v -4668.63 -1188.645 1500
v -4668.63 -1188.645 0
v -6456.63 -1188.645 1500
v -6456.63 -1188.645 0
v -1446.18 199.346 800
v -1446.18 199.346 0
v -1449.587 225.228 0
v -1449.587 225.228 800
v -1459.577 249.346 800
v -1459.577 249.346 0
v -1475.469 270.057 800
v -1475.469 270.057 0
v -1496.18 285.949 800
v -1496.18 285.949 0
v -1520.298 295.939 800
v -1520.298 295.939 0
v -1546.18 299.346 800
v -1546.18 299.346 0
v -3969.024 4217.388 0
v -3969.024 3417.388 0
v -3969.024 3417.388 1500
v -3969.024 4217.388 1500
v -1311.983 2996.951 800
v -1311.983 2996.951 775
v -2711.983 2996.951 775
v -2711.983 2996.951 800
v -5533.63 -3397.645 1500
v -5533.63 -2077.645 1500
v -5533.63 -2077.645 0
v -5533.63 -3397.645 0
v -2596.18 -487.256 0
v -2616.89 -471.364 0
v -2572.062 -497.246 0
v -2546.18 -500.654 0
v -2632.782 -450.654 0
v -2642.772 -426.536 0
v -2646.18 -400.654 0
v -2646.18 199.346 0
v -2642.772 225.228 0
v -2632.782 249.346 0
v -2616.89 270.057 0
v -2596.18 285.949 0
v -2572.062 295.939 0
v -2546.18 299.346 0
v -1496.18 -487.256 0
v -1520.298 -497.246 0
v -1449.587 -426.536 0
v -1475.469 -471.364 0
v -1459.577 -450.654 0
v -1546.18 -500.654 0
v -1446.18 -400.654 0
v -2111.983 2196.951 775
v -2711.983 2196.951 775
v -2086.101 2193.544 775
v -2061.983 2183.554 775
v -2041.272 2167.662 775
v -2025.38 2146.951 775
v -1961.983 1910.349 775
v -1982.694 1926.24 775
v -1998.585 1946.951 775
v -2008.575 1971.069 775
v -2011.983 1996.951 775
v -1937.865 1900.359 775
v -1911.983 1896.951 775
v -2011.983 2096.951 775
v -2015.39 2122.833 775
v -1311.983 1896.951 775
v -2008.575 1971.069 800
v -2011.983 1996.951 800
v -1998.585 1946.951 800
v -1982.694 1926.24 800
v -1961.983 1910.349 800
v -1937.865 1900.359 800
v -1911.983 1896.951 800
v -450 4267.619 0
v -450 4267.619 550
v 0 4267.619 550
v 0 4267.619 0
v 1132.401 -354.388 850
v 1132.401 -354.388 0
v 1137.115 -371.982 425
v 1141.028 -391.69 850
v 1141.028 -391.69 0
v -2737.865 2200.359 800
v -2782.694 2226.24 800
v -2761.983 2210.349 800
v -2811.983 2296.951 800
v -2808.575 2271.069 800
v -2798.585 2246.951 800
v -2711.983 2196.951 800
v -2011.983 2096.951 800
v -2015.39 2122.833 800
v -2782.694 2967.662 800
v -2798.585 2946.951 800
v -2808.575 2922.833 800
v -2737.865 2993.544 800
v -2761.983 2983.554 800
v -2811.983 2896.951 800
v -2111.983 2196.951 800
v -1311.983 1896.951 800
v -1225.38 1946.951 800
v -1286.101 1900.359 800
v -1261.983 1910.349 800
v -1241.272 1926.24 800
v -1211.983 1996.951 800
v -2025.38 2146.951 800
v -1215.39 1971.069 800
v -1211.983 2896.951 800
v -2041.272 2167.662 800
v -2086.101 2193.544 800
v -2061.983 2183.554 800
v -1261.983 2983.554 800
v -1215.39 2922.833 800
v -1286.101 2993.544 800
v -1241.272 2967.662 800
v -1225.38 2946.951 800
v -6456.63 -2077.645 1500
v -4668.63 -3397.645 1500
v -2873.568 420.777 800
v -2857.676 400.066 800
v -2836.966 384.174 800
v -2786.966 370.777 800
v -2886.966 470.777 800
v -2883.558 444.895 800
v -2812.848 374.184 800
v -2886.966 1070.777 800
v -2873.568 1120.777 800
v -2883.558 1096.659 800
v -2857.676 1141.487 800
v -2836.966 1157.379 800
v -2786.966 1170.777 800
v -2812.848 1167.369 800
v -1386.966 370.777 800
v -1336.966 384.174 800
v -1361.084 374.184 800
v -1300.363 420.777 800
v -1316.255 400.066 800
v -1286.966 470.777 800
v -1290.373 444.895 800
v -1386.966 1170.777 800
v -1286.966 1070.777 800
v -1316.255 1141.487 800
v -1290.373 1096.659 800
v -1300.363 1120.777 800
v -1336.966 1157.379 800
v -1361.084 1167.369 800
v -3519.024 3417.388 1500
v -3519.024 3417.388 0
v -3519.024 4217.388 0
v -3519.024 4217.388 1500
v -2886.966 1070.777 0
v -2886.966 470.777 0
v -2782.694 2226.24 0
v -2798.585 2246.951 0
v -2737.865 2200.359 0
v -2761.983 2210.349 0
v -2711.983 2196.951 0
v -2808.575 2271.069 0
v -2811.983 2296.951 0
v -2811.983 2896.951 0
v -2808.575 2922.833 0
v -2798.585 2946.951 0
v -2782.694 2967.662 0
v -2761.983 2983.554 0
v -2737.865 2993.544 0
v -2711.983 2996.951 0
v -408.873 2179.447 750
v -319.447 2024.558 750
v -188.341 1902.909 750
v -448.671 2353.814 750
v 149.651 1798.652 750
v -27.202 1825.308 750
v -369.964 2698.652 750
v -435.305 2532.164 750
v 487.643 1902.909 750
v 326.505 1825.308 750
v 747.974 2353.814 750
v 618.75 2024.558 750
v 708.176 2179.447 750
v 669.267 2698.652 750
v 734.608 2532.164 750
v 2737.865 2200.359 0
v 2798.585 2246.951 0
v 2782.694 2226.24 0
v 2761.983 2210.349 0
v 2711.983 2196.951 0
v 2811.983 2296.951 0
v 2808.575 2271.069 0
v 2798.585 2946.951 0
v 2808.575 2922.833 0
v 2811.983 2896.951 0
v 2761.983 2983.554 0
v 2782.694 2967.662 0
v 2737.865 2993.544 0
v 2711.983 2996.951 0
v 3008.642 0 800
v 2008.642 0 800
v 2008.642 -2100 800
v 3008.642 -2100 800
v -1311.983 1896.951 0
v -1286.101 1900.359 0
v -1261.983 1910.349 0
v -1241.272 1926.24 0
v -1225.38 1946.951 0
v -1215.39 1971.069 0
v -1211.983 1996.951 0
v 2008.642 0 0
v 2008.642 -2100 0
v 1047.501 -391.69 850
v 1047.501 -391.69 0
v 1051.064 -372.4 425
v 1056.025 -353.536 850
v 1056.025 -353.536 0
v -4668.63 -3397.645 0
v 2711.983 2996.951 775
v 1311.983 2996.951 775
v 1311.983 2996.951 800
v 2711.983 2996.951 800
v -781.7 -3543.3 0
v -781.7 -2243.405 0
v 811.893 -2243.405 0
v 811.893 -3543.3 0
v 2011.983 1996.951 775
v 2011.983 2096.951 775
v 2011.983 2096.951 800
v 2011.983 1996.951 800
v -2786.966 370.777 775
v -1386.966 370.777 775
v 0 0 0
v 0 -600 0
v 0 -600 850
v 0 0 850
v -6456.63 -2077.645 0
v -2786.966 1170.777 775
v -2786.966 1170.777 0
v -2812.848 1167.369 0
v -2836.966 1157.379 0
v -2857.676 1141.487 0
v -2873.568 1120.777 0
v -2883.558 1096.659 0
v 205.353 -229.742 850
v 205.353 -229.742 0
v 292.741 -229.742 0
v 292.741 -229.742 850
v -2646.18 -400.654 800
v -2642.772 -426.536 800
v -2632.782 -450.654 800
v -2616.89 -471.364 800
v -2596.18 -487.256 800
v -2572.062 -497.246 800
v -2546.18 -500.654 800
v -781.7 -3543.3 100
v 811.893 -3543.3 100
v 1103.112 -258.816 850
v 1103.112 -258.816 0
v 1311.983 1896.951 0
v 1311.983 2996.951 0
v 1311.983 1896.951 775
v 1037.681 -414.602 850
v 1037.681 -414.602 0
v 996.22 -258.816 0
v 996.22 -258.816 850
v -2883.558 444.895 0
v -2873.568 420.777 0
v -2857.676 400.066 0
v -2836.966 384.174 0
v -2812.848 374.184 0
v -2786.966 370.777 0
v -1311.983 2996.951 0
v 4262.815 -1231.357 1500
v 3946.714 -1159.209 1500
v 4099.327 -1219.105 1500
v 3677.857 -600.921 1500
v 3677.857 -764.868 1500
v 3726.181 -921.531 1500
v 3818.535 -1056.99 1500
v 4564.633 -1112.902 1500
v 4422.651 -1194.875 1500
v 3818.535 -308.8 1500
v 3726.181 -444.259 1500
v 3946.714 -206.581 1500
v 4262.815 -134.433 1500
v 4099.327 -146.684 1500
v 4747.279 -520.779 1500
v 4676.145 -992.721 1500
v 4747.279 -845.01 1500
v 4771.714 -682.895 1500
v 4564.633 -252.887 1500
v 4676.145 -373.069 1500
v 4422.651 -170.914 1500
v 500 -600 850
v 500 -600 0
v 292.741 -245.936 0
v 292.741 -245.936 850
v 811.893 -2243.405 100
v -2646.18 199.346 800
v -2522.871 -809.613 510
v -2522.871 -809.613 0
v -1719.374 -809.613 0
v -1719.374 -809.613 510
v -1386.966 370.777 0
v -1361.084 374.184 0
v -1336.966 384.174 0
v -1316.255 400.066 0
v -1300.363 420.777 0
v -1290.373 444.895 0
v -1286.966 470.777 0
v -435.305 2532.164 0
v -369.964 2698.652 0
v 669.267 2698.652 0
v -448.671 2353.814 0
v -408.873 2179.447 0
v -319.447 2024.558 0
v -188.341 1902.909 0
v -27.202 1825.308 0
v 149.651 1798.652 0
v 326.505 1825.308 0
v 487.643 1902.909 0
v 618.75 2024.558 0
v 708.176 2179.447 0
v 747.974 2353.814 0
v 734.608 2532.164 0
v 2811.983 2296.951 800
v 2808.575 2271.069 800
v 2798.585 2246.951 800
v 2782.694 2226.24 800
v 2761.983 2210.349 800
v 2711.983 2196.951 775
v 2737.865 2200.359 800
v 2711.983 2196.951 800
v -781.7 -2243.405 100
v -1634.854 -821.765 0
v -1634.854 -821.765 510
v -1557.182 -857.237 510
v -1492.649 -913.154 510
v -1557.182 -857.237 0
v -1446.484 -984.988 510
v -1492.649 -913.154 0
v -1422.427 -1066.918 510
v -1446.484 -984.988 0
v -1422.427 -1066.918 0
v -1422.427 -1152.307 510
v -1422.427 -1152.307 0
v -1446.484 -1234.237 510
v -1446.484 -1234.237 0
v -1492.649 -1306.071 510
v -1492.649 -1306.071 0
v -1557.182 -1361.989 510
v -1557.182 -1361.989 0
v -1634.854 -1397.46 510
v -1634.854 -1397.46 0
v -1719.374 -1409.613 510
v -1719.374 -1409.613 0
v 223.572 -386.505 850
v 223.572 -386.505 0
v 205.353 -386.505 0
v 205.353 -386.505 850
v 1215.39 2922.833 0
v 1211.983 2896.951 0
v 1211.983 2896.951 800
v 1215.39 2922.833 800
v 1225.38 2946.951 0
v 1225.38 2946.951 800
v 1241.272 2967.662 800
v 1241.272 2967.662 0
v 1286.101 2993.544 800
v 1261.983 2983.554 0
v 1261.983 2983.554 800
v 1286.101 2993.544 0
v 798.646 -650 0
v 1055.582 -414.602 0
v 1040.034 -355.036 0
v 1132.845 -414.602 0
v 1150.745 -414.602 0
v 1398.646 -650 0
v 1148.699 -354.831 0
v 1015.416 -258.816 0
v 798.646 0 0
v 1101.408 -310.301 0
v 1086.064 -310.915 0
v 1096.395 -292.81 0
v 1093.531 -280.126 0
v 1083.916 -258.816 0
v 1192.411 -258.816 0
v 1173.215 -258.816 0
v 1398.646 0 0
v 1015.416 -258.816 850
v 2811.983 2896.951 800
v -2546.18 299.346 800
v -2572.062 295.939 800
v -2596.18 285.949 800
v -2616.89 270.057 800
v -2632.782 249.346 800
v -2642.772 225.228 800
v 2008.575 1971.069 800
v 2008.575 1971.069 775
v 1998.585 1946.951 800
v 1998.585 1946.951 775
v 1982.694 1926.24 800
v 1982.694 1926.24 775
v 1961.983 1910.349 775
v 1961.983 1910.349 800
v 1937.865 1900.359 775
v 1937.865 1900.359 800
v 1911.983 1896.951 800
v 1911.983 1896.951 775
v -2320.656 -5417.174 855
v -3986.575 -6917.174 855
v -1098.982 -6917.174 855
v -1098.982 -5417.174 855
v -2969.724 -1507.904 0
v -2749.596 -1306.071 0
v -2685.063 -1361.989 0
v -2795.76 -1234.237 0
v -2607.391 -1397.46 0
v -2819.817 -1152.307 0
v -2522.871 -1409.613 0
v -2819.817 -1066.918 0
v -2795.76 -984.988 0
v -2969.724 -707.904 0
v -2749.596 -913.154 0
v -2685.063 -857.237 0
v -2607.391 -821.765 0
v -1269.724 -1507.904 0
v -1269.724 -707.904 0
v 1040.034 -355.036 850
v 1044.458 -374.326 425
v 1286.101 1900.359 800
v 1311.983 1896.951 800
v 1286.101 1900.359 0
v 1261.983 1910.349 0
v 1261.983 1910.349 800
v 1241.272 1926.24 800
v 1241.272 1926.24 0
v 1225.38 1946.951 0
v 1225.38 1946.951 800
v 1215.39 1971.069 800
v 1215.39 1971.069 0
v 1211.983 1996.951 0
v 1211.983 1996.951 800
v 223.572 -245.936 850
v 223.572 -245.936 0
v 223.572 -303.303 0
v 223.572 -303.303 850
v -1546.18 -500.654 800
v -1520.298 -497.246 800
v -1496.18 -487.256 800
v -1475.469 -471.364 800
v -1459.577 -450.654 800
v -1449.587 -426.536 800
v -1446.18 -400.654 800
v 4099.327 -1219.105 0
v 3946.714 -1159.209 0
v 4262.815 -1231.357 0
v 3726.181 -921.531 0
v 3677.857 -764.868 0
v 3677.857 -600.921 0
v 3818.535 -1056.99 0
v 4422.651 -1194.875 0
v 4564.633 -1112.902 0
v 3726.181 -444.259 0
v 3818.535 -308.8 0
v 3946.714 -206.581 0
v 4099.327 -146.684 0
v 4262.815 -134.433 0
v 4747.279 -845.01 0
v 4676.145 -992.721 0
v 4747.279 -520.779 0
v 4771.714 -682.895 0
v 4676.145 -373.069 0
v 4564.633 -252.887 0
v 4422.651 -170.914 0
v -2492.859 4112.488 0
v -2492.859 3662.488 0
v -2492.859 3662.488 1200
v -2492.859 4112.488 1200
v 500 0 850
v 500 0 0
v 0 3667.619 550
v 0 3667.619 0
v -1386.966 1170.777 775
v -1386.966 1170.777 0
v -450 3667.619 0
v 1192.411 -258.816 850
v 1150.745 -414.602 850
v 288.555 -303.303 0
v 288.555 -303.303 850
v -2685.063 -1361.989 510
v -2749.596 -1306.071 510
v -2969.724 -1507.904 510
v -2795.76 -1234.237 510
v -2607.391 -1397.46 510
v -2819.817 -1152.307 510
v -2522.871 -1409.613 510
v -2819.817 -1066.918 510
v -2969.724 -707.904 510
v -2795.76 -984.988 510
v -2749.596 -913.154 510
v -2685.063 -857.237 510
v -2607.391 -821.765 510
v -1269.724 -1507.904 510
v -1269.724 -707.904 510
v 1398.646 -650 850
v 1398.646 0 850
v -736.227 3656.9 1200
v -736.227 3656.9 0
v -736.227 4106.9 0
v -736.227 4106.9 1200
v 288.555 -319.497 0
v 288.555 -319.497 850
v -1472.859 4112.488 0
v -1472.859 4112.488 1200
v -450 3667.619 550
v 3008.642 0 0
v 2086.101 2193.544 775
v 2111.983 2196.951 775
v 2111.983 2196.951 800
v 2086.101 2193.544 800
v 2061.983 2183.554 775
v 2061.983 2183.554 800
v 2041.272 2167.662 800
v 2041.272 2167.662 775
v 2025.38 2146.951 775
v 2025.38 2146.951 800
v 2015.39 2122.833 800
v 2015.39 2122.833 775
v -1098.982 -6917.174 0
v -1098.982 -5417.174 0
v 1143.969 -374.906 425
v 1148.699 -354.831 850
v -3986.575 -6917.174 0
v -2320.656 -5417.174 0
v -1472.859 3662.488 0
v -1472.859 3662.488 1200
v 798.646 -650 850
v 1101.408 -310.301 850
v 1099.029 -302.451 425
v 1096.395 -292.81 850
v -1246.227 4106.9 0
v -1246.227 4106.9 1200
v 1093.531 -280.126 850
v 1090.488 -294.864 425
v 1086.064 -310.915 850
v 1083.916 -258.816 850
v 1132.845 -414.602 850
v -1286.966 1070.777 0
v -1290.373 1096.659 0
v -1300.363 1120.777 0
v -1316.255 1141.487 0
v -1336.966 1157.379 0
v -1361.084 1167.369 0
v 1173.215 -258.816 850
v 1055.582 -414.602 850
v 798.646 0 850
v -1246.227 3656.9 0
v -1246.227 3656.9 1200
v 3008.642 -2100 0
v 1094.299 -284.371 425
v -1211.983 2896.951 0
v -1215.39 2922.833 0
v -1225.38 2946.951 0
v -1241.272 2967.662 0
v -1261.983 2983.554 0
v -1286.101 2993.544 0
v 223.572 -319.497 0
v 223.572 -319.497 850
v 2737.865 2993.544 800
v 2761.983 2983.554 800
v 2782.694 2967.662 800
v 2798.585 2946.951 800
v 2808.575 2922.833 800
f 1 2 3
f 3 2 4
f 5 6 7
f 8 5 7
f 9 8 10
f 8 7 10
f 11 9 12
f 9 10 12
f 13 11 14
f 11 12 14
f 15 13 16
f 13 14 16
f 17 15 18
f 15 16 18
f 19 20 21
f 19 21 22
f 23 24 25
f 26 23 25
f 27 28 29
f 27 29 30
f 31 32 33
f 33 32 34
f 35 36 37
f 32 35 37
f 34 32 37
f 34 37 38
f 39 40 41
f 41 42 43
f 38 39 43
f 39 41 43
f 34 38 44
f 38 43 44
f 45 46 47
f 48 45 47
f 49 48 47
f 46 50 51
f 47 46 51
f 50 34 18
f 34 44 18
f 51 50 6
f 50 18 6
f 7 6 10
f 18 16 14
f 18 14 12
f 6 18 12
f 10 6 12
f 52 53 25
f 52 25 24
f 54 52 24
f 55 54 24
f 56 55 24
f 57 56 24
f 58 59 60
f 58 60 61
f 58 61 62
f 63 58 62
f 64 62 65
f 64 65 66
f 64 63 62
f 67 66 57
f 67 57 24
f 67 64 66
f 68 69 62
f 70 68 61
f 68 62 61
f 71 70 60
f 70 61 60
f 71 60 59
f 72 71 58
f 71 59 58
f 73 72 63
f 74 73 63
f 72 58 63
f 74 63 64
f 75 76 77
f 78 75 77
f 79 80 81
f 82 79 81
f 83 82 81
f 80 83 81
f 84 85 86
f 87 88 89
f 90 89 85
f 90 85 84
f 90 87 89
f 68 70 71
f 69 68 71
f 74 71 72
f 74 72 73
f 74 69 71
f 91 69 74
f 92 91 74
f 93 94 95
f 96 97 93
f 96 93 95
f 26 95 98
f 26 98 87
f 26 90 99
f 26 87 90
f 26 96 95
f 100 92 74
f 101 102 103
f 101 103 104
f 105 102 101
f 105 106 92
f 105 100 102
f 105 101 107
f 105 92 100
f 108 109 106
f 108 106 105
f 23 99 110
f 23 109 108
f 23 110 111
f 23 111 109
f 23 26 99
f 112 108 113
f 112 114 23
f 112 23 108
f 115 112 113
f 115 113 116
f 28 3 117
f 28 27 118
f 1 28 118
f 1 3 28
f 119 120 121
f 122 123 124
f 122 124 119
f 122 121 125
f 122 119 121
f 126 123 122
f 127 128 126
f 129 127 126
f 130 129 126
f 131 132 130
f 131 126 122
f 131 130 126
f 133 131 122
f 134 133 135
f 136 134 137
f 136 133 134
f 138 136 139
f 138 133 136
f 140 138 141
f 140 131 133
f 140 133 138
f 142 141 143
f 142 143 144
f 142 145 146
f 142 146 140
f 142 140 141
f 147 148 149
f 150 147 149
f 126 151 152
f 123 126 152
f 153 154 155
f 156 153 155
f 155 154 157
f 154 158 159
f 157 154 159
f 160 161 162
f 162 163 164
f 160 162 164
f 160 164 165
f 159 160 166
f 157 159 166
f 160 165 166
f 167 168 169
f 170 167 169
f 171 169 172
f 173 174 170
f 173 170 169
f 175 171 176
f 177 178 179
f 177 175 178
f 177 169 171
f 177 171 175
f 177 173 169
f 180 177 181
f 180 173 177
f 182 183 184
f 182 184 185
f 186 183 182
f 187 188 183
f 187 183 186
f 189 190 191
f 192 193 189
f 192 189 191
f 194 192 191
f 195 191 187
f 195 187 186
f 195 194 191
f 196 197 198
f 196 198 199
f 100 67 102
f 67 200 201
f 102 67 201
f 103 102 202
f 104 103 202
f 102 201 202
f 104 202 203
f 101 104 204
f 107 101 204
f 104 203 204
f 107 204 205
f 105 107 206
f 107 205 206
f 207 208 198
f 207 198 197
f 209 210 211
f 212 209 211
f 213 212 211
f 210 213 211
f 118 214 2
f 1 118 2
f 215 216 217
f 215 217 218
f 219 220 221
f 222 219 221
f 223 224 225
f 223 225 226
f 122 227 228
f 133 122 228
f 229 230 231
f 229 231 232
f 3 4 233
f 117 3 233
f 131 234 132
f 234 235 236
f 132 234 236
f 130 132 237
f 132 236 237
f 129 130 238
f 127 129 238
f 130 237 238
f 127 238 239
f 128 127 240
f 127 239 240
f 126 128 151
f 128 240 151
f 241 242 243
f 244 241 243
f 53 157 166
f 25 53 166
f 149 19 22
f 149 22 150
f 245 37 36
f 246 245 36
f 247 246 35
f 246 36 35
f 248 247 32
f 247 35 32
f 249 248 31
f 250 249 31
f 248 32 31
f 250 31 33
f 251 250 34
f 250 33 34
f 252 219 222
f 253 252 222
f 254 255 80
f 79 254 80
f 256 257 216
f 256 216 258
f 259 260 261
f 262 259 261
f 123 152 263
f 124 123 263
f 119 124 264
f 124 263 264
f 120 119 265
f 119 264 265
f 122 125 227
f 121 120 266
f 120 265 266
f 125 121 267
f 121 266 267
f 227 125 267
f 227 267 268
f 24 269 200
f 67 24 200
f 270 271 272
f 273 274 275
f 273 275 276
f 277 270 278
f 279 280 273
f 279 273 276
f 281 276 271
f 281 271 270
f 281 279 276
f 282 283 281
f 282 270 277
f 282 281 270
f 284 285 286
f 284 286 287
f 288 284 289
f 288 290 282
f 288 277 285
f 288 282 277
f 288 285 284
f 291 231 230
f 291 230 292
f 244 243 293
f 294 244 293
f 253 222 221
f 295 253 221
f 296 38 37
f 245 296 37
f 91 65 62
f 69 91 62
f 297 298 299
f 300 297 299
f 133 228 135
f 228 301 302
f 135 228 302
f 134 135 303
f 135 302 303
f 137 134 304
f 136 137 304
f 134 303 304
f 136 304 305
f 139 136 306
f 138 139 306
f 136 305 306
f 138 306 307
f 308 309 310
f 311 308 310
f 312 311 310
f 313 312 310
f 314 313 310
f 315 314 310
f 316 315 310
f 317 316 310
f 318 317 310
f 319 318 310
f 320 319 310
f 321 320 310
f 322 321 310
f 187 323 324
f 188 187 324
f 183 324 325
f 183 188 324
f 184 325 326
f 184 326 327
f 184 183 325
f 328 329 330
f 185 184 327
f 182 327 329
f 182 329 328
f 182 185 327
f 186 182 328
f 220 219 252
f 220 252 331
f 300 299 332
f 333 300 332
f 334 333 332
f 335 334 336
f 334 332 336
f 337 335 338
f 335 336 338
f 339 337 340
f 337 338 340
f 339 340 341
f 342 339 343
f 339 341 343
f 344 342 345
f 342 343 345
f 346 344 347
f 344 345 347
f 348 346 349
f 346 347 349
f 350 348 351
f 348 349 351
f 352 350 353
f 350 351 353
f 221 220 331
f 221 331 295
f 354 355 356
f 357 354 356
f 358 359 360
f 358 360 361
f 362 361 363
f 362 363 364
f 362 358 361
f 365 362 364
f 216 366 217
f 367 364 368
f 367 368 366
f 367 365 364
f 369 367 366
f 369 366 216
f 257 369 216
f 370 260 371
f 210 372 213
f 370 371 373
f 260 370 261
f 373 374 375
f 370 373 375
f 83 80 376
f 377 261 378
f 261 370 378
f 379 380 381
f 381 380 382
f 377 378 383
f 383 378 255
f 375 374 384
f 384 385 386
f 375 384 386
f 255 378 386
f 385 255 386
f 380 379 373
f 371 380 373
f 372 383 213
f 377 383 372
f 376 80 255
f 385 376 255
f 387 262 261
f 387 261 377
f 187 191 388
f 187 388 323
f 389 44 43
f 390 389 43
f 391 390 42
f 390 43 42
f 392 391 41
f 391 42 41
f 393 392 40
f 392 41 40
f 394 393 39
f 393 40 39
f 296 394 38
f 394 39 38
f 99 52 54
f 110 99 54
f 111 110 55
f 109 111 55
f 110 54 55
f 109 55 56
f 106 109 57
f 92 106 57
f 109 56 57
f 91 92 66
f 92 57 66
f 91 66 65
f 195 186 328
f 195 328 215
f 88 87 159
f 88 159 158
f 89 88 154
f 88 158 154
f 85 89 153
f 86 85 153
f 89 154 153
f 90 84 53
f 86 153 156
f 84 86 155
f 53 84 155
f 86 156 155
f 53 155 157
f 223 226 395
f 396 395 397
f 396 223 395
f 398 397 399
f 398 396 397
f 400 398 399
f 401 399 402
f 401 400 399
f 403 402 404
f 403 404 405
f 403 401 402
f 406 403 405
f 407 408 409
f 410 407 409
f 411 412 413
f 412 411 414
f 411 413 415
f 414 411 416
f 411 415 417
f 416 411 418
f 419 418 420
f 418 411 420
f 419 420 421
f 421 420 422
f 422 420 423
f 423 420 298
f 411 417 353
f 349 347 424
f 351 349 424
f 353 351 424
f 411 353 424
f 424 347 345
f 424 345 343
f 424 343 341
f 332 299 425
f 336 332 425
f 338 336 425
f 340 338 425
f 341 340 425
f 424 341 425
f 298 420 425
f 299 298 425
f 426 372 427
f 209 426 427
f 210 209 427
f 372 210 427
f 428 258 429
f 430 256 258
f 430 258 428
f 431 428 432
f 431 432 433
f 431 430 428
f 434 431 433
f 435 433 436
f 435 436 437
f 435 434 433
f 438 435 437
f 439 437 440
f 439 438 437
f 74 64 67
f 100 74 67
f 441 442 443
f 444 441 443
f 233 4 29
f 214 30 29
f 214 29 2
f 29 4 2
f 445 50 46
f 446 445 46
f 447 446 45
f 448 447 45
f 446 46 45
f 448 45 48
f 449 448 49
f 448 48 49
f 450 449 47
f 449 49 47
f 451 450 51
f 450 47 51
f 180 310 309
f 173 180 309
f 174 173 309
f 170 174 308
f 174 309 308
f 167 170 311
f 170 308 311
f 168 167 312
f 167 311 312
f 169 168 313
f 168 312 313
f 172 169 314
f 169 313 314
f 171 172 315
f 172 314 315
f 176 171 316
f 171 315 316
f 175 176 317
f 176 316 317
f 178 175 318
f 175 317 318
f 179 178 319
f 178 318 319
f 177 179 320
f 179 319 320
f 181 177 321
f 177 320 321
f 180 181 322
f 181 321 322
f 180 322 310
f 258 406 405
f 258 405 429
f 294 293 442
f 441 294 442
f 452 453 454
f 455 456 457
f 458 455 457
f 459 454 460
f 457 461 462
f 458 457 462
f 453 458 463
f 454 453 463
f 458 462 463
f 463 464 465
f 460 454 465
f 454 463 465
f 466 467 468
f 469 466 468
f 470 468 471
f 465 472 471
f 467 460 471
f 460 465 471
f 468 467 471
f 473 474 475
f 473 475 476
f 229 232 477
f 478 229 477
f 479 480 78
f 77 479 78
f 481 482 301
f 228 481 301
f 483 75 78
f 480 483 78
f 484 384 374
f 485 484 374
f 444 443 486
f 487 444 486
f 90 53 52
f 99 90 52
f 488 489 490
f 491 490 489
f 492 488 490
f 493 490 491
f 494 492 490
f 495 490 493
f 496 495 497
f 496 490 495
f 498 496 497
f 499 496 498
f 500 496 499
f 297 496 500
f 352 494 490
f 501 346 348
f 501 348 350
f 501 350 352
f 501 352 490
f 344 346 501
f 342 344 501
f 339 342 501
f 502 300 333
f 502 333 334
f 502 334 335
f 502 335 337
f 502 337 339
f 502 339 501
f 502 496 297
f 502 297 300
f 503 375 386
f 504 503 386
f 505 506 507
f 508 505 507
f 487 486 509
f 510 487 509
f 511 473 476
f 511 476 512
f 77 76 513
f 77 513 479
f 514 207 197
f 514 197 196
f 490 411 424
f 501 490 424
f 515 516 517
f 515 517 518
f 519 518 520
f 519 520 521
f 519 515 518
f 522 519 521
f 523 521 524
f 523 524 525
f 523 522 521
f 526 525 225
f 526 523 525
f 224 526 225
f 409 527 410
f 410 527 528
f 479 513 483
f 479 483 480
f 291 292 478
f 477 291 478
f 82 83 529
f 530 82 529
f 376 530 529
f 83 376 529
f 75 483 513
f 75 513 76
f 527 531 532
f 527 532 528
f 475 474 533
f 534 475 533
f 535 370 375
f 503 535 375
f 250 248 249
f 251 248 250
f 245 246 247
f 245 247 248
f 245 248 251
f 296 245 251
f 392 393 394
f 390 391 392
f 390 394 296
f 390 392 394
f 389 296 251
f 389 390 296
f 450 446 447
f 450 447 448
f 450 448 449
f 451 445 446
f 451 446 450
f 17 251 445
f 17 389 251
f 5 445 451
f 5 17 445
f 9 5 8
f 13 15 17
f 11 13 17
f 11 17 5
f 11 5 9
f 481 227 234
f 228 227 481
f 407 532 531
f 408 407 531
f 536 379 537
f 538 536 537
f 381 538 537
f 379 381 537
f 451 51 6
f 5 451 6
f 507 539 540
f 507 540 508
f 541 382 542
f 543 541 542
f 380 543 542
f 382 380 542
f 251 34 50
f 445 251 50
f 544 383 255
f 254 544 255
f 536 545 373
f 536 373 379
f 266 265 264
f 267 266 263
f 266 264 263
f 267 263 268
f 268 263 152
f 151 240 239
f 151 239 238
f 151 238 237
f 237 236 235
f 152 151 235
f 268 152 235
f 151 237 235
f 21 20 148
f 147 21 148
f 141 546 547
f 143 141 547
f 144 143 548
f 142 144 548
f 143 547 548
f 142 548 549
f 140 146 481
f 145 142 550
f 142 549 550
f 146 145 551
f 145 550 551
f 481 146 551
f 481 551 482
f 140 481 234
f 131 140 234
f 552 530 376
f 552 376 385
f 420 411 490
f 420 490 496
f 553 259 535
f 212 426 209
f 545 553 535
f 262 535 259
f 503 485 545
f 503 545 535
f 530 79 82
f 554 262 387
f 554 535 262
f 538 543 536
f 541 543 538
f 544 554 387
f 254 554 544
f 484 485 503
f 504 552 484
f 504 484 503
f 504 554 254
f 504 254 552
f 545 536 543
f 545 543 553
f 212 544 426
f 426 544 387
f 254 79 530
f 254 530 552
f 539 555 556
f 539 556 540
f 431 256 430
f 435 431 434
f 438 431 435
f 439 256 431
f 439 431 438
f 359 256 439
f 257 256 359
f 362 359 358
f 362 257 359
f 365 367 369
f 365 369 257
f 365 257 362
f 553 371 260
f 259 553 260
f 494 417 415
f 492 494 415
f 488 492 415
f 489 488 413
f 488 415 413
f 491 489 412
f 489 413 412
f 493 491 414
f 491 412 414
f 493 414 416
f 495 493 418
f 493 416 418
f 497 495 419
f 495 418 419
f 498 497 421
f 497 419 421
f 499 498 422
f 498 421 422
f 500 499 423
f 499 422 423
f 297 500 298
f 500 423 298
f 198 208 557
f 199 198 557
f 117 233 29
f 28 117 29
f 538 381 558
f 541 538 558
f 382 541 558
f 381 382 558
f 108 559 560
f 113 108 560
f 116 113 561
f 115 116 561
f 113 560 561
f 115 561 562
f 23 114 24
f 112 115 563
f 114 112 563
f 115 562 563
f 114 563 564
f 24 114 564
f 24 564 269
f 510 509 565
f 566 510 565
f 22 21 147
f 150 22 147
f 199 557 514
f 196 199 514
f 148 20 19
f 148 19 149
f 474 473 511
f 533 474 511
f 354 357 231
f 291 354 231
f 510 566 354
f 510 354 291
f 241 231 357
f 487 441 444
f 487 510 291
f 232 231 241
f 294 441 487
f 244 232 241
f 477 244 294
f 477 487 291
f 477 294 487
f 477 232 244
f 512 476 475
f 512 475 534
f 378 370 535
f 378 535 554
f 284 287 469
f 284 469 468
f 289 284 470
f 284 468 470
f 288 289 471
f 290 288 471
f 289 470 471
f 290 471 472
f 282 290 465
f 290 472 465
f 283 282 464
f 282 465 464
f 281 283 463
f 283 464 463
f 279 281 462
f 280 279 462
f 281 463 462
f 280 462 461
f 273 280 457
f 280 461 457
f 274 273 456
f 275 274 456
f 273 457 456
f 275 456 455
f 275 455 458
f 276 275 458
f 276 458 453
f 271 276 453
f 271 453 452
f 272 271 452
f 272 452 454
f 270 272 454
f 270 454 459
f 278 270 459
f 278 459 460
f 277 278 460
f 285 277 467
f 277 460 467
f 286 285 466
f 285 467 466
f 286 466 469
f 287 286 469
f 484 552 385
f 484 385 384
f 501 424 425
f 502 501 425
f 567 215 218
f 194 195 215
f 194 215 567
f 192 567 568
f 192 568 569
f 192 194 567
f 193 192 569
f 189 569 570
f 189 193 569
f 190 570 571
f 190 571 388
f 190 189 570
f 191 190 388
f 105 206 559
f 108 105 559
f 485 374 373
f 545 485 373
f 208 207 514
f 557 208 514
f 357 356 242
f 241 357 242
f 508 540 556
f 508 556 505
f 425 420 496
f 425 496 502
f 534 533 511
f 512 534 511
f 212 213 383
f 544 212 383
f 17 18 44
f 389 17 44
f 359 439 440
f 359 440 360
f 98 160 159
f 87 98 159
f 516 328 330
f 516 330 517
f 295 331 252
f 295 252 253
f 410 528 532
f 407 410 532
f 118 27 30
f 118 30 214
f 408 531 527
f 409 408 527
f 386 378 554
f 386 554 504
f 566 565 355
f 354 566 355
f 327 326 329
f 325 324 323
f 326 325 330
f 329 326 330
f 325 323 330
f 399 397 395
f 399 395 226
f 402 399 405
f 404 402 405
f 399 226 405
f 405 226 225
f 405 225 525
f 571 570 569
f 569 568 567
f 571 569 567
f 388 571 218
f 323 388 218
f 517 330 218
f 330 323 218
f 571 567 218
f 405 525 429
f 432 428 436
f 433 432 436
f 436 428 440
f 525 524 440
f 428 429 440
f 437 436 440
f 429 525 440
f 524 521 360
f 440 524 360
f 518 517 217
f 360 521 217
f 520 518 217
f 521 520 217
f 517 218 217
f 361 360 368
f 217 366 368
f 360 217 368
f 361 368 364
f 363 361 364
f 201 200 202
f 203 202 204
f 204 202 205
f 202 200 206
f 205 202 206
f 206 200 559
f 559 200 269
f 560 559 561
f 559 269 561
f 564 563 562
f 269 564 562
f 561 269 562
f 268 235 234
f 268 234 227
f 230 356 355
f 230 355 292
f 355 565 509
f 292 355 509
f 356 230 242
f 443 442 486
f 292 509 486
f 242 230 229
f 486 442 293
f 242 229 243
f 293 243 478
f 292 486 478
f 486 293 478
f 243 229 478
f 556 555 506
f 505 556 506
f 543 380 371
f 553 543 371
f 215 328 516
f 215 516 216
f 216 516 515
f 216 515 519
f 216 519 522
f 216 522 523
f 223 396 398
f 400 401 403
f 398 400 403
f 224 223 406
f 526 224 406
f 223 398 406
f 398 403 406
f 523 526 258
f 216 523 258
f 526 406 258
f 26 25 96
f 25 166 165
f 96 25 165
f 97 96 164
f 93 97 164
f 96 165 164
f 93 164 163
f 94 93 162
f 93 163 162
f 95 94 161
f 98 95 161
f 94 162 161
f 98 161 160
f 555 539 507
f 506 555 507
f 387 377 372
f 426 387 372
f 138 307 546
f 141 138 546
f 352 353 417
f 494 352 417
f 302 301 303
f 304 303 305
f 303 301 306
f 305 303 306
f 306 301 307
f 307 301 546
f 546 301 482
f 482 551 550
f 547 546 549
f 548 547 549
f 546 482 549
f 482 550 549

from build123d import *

# Parameters (mm, degrees)
F0_W      = 500
F0_H      = 600
F1_DEPTH  = 850
F2_W      = 600
F2_H      = 650
F3_DEPTH  = 850
F4_W      = 1000
F4_H      = 2100
F5_DEPTH  = 800
F6_R      = 550
F7_DEPTH  = 1500
F8_W      = 1700
F8_H      = 800
F9_DEPTH  = 510
F11_DEPTH = 855
F12_W     = 1593.5931801796
F12_H     = 1299.8950481415
F13_DEPTH = 100
F15_DEPTH = 800
F17_DEPTH = 800
F18_W     = 1020
F18_H     = 450
F19_DEPTH = 1200
F21_DEPTH = 750
F23_DEPTH = 800
F24_W     = 510
F24_H     = 450
F25_DEPTH = 1200
F26_W     = 450
F26_H     = 600
F27_DEPTH = 550
F28_W     = 1400
F28_H     = 800
F29_DEPTH = 775
F31_DEPTH = 775
F33_W     = 450
F33_H     = 800
F34_DEPTH = 1500
F36_DEPTH = 1500


with BuildPart() as f1:
    # F0 (on Top) → F1 (new body)
    with BuildSketch(Plane.XY):
        with Locations((250, -300)):
            Rectangle(F0_W, F0_H)
        Polygon((223.5717567124, -319.4969488541), (223.5717567124, -386.5047097206), (205.3530567533, -386.5047097206), (205.3530567533, -229.7415456657), (292.741058252, -229.7415456657), (292.741058252, -245.9359456293), (223.5717567124, -245.9359456293), (223.5717567124, -303.3025488904), (288.5552175835, -303.3025488904), (288.5552175835, -319.4969488541), align=None, mode=Mode.SUBTRACT)
    extrude(amount=F1_DEPTH)


with BuildPart() as f3:
    # F2 (on Top) → F3 (new body)
    with BuildSketch(Plane.XY):
        with Locations((1098.6456545318, -325)):
            Rectangle(F2_W, F2_H)
        with BuildLine():
            Line((1192.4111198944, -258.8157182715), (1150.7452339348, -414.6024882793))
            Line((1150.7452339348, -414.6024882793), (1132.8445873482, -414.6024882793))
            Line((1132.8445873482, -414.6024882793), (1101.4076422952, -310.3013875015))
            add(Edge.make_bspline(
                [(1101.4076422952, -310.3013875015), (1099.1572752957, -303.345707685), (1096.3954612509, -292.8098985511)],
                knots=[0, 0, 0, 1, 1, 1], degree=2))
            add(Edge.make_bspline(
                [(1096.3954612509, -292.8098985511), (1093.6336472061, -282.2740894173), (1093.5313577971, -280.1260118269)],
                knots=[0, 0, 0, 1, 1, 1], degree=2))
            add(Edge.make_bspline(
                [(1093.5313577971, -280.1260118269), (1091.1787013885, -294.2078538084), (1086.0642309352, -310.9151239559)],
                knots=[0, 0, 0, 1, 1, 1], degree=2))
            Line((1086.0642309352, -310.9151239559), (1055.5819870335, -414.6024882793))
            Line((1055.5819870335, -414.6024882793), (1037.6813404469, -414.6024882793))
            Line((1037.6813404469, -414.6024882793), (996.2200333054, -258.8157182715))
            Line((996.2200333054, -258.8157182715), (1015.4163457402, -258.8157182715))
            Line((1015.4163457402, -258.8157182715), (1040.0339968554, -355.0359557331))
            add(Edge.make_bspline(
                [(1040.0339968554, -355.0359557331), (1045.1484673087, -375.2892587282), (1047.5011237173, -391.6896606485)],
                knots=[0, 0, 0, 1, 1, 1], degree=2))
            add(Edge.make_bspline(
                [(1047.5011237173, -391.6896606485), (1050.3652271711, -372.1864799865), (1056.0252411394, -353.5357110668)],
                knots=[0, 0, 0, 1, 1, 1], degree=2))
            Line((1056.0252411394, -353.5357110668), (1083.9161533448, -258.8157182715))
            Line((1083.9161533448, -258.8157182715), (1103.1124657796, -258.8157182715))
            Line((1103.1124657796, -258.8157182715), (1132.4013332422, -354.388122809))
            add(Edge.make_bspline(
                [(1132.4013332422, -354.388122809), (1137.5158036956, -370.9249106081), (1141.0277400735, -391.6896606485)],
                knots=[0, 0, 0, 1, 1, 1], degree=2))
            add(Edge.make_bspline(
                [(1141.0277400735, -391.6896606485), (1143.0735282548, -376.5508281067), (1148.6994457535, -354.831376915)],
                knots=[0, 0, 0, 1, 1, 1], degree=2))
            Line((1148.6994457535, -354.831376915), (1173.2148074597, -258.8157182715))
            Line((1173.2148074597, -258.8157182715), (1192.4111198944, -258.8157182715))
        make_face(mode=Mode.SUBTRACT)
    extrude(amount=F3_DEPTH)


with BuildPart() as f5:
    # F4 (on Top) → F5 (new body)
    with BuildSketch(Plane.XY):
        with Locations((2508.6424085116, -1050)):
            Rectangle(F4_W, F4_H)
    extrude(amount=F5_DEPTH)


with BuildPart() as f7:
    # F6 (on Top) → F7 (new body)
    with BuildSketch(Plane.XY):
        with Locations((4221.7135429382, -682.8946471214)):
            Circle(F6_R)
    extrude(amount=F7_DEPTH)


with BuildPart() as f9:
    # F8 (on Top) → F9 (new body)
    with BuildSketch(Plane.XY):
        with Locations((-2119.7242736816, -1107.903816368)):
            Rectangle(F8_W, F8_H)
        with BuildLine():
            Line((-1719.3738222122, -1409.6125841141), (-2522.8707790375, -1409.6125841141))
            ThreePointArc((-2522.8707790375, -1409.6125841141), (-2822.8707790375, -1109.6125841141), (-2522.8707790375, -809.6125841141))
            Line((-2522.8707790375, -809.6125841141), (-1719.3738222122, -809.6125841141))
            ThreePointArc((-1719.3738222122, -809.6125841141), (-1419.3738222122, -1109.6125841141), (-1719.3738222122, -1409.6125841141))
        make_face(mode=Mode.SUBTRACT)
    extrude(amount=F9_DEPTH)


with BuildPart() as f11:
    # F10 (on Top) → F11 (new body)
    with BuildSketch(Plane.XY):
        Polygon((-2320.655877567, -5417.1743392944), (-3986.5746498108, -6917.1743392944), (-1098.9821112549, -6917.1743392944), (-1098.9821112549, -5417.1743392944), align=None)
    extrude(amount=F11_DEPTH)


with BuildPart() as f13:
    # F12 (on Top) → F13 (new body)
    with BuildSketch(Plane.XY):
        with Locations((15.0963366032, -2893.3526277542)):
            Rectangle(F12_W, F12_H)
    extrude(amount=F13_DEPTH)


with BuildPart() as f15:
    # F14 (on Top) → F15 (new body)
    with BuildSketch(Plane.XY):
        with BuildLine():
            Line((-1386.965637207, 1170.7768023014), (-2786.965637207, 1170.7768023014))
            ThreePointArc((-2786.965637207, 1170.7768023014), (-2857.6763153257, 1141.4874804201), (-2886.965637207, 1070.7768023014))
            Line((-2886.965637207, 1070.7768023014), (-2886.965637207, 470.7768023014))
            ThreePointArc((-2886.965637207, 470.7768023014), (-2857.6763153257, 400.0661241828), (-2786.965637207, 370.7768023014))
            Line((-2786.965637207, 370.7768023014), (-1386.965637207, 370.7768023014))
            ThreePointArc((-1386.965637207, 370.7768023014), (-1316.2549590884, 400.0661241828), (-1286.965637207, 470.7768023014))
            Line((-1286.965637207, 470.7768023014), (-1286.965637207, 1070.7768023014))
            ThreePointArc((-1286.965637207, 1070.7768023014), (-1316.2549590884, 1141.4874804201), (-1386.965637207, 1170.7768023014))
        make_face()
    extrude(amount=F15_DEPTH)

    # F28 (on face) → F29 (cut)
    with BuildSketch(Plane(origin=(0, 0, 0), x_dir=(1, 0, 0), z_dir=(0, 0, -1))):
        with Locations((-2086.965637207, -770.7768023014)):
            Rectangle(F28_W, F28_H)
    extrude(amount=-F29_DEPTH, mode=Mode.SUBTRACT)


with BuildPart() as f17:
    # F16 (on Top) → F17 (new body)
    with BuildSketch(Plane.XY):
        with BuildLine():
            Line((-1311.9828701019, 2996.9511508942), (-2711.9828701019, 2996.9511508942))
            ThreePointArc((-2711.9828701019, 2996.9511508942), (-2782.6935482206, 2967.6618290128), (-2811.9828701019, 2896.9511508942))
            Line((-2811.9828701019, 2896.9511508942), (-2811.9828701019, 2296.9511508942))
            ThreePointArc((-2811.9828701019, 2296.9511508942), (-2782.6935482206, 2226.2404727755), (-2711.9828701019, 2196.9511508942))
            Line((-2711.9828701019, 2196.9511508942), (-2111.9828701019, 2196.9511508942))
            ThreePointArc((-2111.9828701019, 2196.9511508942), (-2041.2721919833, 2167.6618290128), (-2011.9828701019, 2096.9511508942))
            Line((-2011.9828701019, 2096.9511508942), (-2011.9828701019, 1996.9511508942))
            ThreePointArc((-2011.9828701019, 1996.9511508942), (-1982.6935482206, 1926.2404727755), (-1911.9828701019, 1896.9511508942))
            Line((-1911.9828701019, 1896.9511508942), (-1311.9828701019, 1896.9511508942))
            ThreePointArc((-1311.9828701019, 1896.9511508942), (-1241.2721919833, 1926.2404727755), (-1211.9828701019, 1996.9511508942))
            Line((-1211.9828701019, 1996.9511508942), (-1211.9828701019, 2896.9511508942))
            ThreePointArc((-1211.9828701019, 2896.9511508942), (-1241.2721919833, 2967.6618290128), (-1311.9828701019, 2996.9511508942))
        make_face()
    extrude(amount=F17_DEPTH)

    # F30 (on face) → F31 (cut)
    with BuildSketch(Plane(origin=(0, 0, 0), x_dir=(1, 0, 0), z_dir=(0, 0, -1))):
        Polygon((-2711.9828701019, -1896.9511508942), (-2711.9828701019, -2196.9511508942), (-2711.9828701019, -2996.9511508942), (-1311.9828701019, -2996.9511508942), (-1311.9828701019, -1896.9511508942), align=None)
    extrude(amount=-F31_DEPTH, mode=Mode.SUBTRACT)


with BuildPart() as f19:
    # F18 (on Top) → F19 (new body)
    with BuildSketch(Plane.XY):
        with Locations((-1982.8592801094, 3887.4884605408)):
            Rectangle(F18_W, F18_H)
    extrude(amount=F19_DEPTH)


with BuildPart() as f21:
    # F20 (on Top) → F21 (new body)
    with BuildSketch(Plane.XY):
        with BuildLine():
            ThreePointArc((-369.9638340752, 2098.6518383026), (149.6514081955, 1798.6518383026), (669.2666504662, 2098.6518383026))
            Line((669.2666504662, 2098.6518383026), (-369.9638340752, 2098.6518383026))
        make_face()
        with BuildLine():
            ThreePointArc((669.2666504662, 2098.6518383026), (729.2069039689, 2243.3604112411), (749.6514081955, 2398.6518383026))
            ThreePointArc((749.6514081955, 2398.6518383026), (729.2069039689, 2553.9432653641), (669.2666504662, 2698.6518383026))
            Line((669.2666504662, 2698.6518383026), (-369.9638340752, 2698.6518383026))
            ThreePointArc((-369.9638340752, 2698.6518383026), (-450.3485918045, 2398.6518383026), (-369.9638340752, 2098.6518383026))
            Line((-369.9638340752, 2098.6518383026), (669.2666504662, 2098.6518383026))
        make_face()
    extrude(amount=F21_DEPTH)


with BuildPart() as f23:
    # F22 (on Top) → F23 (new body)
    with BuildSketch(Plane.XY):
        with BuildLine():
            Line((-1546.1797475815, 299.3462848663), (-2546.1797475815, 299.3462848663))
            ThreePointArc((-2546.1797475815, 299.3462848663), (-2616.8904257001, 270.056962985), (-2646.1797475815, 199.3462848663))
            Line((-2646.1797475815, 199.3462848663), (-2646.1797475815, -400.6537151337))
            ThreePointArc((-2646.1797475815, -400.6537151337), (-2616.8904257001, -471.3643932523), (-2546.1797475815, -500.6537151337))
            Line((-2546.1797475815, -500.6537151337), (-1546.1797475815, -500.6537151337))
            ThreePointArc((-1546.1797475815, -500.6537151337), (-1475.4690694628, -471.3643932523), (-1446.1797475815, -400.6537151337))
            Line((-1446.1797475815, -400.6537151337), (-1446.1797475815, 199.3462848663))
            ThreePointArc((-1446.1797475815, 199.3462848663), (-1475.4690694628, 270.056962985), (-1546.1797475815, 299.3462848663))
        make_face()
    extrude(amount=F23_DEPTH)


with BuildPart() as f25:
    # F24 (on Top) → F25 (new body)
    with BuildSketch(Plane.XY):
        with Locations((-991.2273931503, 3881.9004058838)):
            Rectangle(F24_W, F24_H)
    extrude(amount=F25_DEPTH)


with BuildPart() as f27:
    # F26 (on Top) → F27 (new body)
    with BuildSketch(Plane.XY):
        with Locations((-225, 3967.6189899445)):
            Rectangle(F26_W, F26_H)
    extrude(amount=F27_DEPTH)


with BuildPart() as f32_1:
    # F32: instance of F17
    add(f17.part.mirror(Plane.YZ))


with BuildPart() as f34:
    # F33 (on Top) → F34 (new body)
    with BuildSketch(Plane.XY):
        with Locations((-3744.0237045288, 3817.3877239227)):
            Rectangle(F33_W, F33_H)
    extrude(amount=F34_DEPTH)


with BuildPart() as f36:
    # F35 (on Top) → F36 (new body)
    with BuildSketch(Plane.XY):
        Polygon((-4668.6296169174, -1188.6452989578), (-6456.6296169174, -1188.6452989578), (-6456.6296169174, -2077.6452989578), (-5533.6296169174, -2077.6450608453), (-5533.6296169174, -3397.6452989578), (-4668.6296169174, -3397.6452989578), align=None)
    extrude(amount=F36_DEPTH)


solid = Compound([f1.part, f3.part, f5.part, f7.part, f9.part, f11.part, f13.part, f15.part, f17.part, f19.part, f21.part, f23.part, f25.part, f27.part, f32_1.part, f34.part, f36.part])
